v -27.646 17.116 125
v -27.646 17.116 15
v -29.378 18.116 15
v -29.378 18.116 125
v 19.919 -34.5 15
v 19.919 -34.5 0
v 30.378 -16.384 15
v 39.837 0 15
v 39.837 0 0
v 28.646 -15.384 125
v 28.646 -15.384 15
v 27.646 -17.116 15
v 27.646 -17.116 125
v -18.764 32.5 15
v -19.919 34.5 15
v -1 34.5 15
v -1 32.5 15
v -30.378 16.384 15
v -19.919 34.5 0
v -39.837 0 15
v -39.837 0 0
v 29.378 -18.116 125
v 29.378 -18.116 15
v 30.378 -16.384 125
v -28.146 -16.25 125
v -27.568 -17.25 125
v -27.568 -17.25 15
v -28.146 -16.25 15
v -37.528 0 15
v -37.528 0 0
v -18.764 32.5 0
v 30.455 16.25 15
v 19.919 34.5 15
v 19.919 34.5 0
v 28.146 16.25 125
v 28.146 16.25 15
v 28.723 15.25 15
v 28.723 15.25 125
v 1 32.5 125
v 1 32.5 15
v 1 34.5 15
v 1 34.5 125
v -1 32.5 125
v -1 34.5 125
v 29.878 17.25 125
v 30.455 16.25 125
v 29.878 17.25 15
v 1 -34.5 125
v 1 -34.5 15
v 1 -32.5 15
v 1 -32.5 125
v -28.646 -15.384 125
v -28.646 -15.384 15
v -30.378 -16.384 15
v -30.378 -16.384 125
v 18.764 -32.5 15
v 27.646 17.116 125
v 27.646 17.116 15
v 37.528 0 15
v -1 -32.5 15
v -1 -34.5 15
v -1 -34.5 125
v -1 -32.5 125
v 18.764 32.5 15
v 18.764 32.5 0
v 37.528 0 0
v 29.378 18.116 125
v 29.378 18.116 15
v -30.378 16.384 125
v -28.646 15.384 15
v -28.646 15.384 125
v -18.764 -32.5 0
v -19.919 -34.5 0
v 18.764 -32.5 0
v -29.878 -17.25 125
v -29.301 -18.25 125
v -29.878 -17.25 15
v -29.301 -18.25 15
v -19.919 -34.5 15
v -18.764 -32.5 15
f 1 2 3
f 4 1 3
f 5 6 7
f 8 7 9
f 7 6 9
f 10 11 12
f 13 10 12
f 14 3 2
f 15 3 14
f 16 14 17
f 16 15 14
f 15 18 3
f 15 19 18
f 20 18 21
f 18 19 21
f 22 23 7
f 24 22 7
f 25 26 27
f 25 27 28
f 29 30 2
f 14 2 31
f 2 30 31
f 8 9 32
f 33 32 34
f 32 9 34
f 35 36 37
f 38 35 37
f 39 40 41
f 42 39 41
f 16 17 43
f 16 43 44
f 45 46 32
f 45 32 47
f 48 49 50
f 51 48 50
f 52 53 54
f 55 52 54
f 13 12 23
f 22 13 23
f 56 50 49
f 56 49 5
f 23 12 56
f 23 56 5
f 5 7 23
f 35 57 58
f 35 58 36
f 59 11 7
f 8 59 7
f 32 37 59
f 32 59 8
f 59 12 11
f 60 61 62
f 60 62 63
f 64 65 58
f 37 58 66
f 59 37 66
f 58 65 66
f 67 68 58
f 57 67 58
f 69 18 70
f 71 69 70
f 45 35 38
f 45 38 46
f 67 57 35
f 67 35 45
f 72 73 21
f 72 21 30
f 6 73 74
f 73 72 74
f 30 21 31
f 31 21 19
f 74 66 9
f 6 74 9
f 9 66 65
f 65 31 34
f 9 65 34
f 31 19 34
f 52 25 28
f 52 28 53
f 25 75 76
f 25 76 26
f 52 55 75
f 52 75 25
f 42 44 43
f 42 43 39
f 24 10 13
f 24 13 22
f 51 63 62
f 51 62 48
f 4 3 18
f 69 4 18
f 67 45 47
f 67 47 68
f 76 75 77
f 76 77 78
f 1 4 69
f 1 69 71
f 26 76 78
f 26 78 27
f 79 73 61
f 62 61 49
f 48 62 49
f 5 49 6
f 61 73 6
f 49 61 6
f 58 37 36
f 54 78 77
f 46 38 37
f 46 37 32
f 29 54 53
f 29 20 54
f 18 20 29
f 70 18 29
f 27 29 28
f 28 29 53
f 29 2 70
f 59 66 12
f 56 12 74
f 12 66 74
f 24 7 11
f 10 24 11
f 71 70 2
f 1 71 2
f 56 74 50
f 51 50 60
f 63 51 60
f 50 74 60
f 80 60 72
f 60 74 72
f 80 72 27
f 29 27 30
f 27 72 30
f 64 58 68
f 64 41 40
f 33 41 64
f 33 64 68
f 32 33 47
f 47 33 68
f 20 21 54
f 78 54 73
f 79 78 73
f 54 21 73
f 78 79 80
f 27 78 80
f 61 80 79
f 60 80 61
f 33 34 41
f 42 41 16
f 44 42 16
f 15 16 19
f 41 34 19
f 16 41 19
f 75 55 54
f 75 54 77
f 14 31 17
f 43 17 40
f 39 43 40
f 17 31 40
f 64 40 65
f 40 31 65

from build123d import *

# Parameters (mm, degrees)
F1_DEPTH = 15
F2_W     = 1
F2_H     = 2
F3_DEPTH = 110
F4_W     = 2
F4_H     = 2
F5_DEPTH = 2


with BuildPart() as f1:
    # F0 (on Top) → F1 (new body)
    with BuildSketch(Plane.XY):
        Polygon((-19.918584, -34.5), (19.918584, -34.5), (39.837169, 0), (19.918584, 34.5), (-19.918584, 34.5), (-39.837169, 0), align=None)
        Polygon((37.527767, 0), (18.763884, -32.5), (-18.763884, -32.5), (-37.527767, 0), (-18.763884, 32.5), (18.763884, 32.5), align=None, mode=Mode.SUBTRACT)
    extrude(amount=F1_DEPTH)

    # F2 (on face) → F3 (join)
    with BuildSketch(Plane.XY.offset(15)):
        Polygon((-28.645826, 15.383975), (-28.145826, 16.25), (-29.877876, 17.25), (-30.377876, 16.383975), align=None)
        Polygon((-29.877876, 17.25), (-28.145826, 16.25), (-27.645826, 17.116025), (-29.377876, 18.116025), align=None)
        with Locations((-0.5, 33.5)):
            Rectangle(F2_W, F2_H)
        with Locations((0.5, 33.5)):
            Rectangle(F2_W, F2_H)
        Polygon((27.645826, 17.116025), (28.145826, 16.25), (29.877876, 17.25), (29.377876, 18.116025), align=None)
        Polygon((29.877876, 17.25), (28.145826, 16.25), (28.723176, 15.25), (30.455227, 16.25), align=None)
        Polygon((28.145826, -16.25), (29.877876, -17.25), (30.377876, -16.383975), (28.645826, -15.383975), align=None)
        Polygon((27.645826, -17.116025), (29.377876, -18.116025), (29.877876, -17.25), (28.145826, -16.25), align=None)
        with Locations((0.5, -33.5)):
            Rectangle(F2_W, F2_H)
        with Locations((-0.5, -33.5)):
            Rectangle(F2_W, F2_H)
        Polygon((-29.877876, -17.25), (-29.300526, -18.25), (-27.568475, -17.25), (-28.145826, -16.25), align=None)
        Polygon((-30.377876, -16.383975), (-29.877876, -17.25), (-28.145826, -16.25), (-28.645826, -15.383975), align=None)
    extrude(amount=F3_DEPTH)

    # F4 (on face) → F5 (join)
    with BuildSketch(Plane(origin=(0, 34.5, 0), x_dir=(-1, 0, 0), z_dir=(0, 1, 0))):
        with Locations((0, 36)):
            Rectangle(F4_W, F4_H)
    extrude(amount=-F5_DEPTH)


solid = f1.part
